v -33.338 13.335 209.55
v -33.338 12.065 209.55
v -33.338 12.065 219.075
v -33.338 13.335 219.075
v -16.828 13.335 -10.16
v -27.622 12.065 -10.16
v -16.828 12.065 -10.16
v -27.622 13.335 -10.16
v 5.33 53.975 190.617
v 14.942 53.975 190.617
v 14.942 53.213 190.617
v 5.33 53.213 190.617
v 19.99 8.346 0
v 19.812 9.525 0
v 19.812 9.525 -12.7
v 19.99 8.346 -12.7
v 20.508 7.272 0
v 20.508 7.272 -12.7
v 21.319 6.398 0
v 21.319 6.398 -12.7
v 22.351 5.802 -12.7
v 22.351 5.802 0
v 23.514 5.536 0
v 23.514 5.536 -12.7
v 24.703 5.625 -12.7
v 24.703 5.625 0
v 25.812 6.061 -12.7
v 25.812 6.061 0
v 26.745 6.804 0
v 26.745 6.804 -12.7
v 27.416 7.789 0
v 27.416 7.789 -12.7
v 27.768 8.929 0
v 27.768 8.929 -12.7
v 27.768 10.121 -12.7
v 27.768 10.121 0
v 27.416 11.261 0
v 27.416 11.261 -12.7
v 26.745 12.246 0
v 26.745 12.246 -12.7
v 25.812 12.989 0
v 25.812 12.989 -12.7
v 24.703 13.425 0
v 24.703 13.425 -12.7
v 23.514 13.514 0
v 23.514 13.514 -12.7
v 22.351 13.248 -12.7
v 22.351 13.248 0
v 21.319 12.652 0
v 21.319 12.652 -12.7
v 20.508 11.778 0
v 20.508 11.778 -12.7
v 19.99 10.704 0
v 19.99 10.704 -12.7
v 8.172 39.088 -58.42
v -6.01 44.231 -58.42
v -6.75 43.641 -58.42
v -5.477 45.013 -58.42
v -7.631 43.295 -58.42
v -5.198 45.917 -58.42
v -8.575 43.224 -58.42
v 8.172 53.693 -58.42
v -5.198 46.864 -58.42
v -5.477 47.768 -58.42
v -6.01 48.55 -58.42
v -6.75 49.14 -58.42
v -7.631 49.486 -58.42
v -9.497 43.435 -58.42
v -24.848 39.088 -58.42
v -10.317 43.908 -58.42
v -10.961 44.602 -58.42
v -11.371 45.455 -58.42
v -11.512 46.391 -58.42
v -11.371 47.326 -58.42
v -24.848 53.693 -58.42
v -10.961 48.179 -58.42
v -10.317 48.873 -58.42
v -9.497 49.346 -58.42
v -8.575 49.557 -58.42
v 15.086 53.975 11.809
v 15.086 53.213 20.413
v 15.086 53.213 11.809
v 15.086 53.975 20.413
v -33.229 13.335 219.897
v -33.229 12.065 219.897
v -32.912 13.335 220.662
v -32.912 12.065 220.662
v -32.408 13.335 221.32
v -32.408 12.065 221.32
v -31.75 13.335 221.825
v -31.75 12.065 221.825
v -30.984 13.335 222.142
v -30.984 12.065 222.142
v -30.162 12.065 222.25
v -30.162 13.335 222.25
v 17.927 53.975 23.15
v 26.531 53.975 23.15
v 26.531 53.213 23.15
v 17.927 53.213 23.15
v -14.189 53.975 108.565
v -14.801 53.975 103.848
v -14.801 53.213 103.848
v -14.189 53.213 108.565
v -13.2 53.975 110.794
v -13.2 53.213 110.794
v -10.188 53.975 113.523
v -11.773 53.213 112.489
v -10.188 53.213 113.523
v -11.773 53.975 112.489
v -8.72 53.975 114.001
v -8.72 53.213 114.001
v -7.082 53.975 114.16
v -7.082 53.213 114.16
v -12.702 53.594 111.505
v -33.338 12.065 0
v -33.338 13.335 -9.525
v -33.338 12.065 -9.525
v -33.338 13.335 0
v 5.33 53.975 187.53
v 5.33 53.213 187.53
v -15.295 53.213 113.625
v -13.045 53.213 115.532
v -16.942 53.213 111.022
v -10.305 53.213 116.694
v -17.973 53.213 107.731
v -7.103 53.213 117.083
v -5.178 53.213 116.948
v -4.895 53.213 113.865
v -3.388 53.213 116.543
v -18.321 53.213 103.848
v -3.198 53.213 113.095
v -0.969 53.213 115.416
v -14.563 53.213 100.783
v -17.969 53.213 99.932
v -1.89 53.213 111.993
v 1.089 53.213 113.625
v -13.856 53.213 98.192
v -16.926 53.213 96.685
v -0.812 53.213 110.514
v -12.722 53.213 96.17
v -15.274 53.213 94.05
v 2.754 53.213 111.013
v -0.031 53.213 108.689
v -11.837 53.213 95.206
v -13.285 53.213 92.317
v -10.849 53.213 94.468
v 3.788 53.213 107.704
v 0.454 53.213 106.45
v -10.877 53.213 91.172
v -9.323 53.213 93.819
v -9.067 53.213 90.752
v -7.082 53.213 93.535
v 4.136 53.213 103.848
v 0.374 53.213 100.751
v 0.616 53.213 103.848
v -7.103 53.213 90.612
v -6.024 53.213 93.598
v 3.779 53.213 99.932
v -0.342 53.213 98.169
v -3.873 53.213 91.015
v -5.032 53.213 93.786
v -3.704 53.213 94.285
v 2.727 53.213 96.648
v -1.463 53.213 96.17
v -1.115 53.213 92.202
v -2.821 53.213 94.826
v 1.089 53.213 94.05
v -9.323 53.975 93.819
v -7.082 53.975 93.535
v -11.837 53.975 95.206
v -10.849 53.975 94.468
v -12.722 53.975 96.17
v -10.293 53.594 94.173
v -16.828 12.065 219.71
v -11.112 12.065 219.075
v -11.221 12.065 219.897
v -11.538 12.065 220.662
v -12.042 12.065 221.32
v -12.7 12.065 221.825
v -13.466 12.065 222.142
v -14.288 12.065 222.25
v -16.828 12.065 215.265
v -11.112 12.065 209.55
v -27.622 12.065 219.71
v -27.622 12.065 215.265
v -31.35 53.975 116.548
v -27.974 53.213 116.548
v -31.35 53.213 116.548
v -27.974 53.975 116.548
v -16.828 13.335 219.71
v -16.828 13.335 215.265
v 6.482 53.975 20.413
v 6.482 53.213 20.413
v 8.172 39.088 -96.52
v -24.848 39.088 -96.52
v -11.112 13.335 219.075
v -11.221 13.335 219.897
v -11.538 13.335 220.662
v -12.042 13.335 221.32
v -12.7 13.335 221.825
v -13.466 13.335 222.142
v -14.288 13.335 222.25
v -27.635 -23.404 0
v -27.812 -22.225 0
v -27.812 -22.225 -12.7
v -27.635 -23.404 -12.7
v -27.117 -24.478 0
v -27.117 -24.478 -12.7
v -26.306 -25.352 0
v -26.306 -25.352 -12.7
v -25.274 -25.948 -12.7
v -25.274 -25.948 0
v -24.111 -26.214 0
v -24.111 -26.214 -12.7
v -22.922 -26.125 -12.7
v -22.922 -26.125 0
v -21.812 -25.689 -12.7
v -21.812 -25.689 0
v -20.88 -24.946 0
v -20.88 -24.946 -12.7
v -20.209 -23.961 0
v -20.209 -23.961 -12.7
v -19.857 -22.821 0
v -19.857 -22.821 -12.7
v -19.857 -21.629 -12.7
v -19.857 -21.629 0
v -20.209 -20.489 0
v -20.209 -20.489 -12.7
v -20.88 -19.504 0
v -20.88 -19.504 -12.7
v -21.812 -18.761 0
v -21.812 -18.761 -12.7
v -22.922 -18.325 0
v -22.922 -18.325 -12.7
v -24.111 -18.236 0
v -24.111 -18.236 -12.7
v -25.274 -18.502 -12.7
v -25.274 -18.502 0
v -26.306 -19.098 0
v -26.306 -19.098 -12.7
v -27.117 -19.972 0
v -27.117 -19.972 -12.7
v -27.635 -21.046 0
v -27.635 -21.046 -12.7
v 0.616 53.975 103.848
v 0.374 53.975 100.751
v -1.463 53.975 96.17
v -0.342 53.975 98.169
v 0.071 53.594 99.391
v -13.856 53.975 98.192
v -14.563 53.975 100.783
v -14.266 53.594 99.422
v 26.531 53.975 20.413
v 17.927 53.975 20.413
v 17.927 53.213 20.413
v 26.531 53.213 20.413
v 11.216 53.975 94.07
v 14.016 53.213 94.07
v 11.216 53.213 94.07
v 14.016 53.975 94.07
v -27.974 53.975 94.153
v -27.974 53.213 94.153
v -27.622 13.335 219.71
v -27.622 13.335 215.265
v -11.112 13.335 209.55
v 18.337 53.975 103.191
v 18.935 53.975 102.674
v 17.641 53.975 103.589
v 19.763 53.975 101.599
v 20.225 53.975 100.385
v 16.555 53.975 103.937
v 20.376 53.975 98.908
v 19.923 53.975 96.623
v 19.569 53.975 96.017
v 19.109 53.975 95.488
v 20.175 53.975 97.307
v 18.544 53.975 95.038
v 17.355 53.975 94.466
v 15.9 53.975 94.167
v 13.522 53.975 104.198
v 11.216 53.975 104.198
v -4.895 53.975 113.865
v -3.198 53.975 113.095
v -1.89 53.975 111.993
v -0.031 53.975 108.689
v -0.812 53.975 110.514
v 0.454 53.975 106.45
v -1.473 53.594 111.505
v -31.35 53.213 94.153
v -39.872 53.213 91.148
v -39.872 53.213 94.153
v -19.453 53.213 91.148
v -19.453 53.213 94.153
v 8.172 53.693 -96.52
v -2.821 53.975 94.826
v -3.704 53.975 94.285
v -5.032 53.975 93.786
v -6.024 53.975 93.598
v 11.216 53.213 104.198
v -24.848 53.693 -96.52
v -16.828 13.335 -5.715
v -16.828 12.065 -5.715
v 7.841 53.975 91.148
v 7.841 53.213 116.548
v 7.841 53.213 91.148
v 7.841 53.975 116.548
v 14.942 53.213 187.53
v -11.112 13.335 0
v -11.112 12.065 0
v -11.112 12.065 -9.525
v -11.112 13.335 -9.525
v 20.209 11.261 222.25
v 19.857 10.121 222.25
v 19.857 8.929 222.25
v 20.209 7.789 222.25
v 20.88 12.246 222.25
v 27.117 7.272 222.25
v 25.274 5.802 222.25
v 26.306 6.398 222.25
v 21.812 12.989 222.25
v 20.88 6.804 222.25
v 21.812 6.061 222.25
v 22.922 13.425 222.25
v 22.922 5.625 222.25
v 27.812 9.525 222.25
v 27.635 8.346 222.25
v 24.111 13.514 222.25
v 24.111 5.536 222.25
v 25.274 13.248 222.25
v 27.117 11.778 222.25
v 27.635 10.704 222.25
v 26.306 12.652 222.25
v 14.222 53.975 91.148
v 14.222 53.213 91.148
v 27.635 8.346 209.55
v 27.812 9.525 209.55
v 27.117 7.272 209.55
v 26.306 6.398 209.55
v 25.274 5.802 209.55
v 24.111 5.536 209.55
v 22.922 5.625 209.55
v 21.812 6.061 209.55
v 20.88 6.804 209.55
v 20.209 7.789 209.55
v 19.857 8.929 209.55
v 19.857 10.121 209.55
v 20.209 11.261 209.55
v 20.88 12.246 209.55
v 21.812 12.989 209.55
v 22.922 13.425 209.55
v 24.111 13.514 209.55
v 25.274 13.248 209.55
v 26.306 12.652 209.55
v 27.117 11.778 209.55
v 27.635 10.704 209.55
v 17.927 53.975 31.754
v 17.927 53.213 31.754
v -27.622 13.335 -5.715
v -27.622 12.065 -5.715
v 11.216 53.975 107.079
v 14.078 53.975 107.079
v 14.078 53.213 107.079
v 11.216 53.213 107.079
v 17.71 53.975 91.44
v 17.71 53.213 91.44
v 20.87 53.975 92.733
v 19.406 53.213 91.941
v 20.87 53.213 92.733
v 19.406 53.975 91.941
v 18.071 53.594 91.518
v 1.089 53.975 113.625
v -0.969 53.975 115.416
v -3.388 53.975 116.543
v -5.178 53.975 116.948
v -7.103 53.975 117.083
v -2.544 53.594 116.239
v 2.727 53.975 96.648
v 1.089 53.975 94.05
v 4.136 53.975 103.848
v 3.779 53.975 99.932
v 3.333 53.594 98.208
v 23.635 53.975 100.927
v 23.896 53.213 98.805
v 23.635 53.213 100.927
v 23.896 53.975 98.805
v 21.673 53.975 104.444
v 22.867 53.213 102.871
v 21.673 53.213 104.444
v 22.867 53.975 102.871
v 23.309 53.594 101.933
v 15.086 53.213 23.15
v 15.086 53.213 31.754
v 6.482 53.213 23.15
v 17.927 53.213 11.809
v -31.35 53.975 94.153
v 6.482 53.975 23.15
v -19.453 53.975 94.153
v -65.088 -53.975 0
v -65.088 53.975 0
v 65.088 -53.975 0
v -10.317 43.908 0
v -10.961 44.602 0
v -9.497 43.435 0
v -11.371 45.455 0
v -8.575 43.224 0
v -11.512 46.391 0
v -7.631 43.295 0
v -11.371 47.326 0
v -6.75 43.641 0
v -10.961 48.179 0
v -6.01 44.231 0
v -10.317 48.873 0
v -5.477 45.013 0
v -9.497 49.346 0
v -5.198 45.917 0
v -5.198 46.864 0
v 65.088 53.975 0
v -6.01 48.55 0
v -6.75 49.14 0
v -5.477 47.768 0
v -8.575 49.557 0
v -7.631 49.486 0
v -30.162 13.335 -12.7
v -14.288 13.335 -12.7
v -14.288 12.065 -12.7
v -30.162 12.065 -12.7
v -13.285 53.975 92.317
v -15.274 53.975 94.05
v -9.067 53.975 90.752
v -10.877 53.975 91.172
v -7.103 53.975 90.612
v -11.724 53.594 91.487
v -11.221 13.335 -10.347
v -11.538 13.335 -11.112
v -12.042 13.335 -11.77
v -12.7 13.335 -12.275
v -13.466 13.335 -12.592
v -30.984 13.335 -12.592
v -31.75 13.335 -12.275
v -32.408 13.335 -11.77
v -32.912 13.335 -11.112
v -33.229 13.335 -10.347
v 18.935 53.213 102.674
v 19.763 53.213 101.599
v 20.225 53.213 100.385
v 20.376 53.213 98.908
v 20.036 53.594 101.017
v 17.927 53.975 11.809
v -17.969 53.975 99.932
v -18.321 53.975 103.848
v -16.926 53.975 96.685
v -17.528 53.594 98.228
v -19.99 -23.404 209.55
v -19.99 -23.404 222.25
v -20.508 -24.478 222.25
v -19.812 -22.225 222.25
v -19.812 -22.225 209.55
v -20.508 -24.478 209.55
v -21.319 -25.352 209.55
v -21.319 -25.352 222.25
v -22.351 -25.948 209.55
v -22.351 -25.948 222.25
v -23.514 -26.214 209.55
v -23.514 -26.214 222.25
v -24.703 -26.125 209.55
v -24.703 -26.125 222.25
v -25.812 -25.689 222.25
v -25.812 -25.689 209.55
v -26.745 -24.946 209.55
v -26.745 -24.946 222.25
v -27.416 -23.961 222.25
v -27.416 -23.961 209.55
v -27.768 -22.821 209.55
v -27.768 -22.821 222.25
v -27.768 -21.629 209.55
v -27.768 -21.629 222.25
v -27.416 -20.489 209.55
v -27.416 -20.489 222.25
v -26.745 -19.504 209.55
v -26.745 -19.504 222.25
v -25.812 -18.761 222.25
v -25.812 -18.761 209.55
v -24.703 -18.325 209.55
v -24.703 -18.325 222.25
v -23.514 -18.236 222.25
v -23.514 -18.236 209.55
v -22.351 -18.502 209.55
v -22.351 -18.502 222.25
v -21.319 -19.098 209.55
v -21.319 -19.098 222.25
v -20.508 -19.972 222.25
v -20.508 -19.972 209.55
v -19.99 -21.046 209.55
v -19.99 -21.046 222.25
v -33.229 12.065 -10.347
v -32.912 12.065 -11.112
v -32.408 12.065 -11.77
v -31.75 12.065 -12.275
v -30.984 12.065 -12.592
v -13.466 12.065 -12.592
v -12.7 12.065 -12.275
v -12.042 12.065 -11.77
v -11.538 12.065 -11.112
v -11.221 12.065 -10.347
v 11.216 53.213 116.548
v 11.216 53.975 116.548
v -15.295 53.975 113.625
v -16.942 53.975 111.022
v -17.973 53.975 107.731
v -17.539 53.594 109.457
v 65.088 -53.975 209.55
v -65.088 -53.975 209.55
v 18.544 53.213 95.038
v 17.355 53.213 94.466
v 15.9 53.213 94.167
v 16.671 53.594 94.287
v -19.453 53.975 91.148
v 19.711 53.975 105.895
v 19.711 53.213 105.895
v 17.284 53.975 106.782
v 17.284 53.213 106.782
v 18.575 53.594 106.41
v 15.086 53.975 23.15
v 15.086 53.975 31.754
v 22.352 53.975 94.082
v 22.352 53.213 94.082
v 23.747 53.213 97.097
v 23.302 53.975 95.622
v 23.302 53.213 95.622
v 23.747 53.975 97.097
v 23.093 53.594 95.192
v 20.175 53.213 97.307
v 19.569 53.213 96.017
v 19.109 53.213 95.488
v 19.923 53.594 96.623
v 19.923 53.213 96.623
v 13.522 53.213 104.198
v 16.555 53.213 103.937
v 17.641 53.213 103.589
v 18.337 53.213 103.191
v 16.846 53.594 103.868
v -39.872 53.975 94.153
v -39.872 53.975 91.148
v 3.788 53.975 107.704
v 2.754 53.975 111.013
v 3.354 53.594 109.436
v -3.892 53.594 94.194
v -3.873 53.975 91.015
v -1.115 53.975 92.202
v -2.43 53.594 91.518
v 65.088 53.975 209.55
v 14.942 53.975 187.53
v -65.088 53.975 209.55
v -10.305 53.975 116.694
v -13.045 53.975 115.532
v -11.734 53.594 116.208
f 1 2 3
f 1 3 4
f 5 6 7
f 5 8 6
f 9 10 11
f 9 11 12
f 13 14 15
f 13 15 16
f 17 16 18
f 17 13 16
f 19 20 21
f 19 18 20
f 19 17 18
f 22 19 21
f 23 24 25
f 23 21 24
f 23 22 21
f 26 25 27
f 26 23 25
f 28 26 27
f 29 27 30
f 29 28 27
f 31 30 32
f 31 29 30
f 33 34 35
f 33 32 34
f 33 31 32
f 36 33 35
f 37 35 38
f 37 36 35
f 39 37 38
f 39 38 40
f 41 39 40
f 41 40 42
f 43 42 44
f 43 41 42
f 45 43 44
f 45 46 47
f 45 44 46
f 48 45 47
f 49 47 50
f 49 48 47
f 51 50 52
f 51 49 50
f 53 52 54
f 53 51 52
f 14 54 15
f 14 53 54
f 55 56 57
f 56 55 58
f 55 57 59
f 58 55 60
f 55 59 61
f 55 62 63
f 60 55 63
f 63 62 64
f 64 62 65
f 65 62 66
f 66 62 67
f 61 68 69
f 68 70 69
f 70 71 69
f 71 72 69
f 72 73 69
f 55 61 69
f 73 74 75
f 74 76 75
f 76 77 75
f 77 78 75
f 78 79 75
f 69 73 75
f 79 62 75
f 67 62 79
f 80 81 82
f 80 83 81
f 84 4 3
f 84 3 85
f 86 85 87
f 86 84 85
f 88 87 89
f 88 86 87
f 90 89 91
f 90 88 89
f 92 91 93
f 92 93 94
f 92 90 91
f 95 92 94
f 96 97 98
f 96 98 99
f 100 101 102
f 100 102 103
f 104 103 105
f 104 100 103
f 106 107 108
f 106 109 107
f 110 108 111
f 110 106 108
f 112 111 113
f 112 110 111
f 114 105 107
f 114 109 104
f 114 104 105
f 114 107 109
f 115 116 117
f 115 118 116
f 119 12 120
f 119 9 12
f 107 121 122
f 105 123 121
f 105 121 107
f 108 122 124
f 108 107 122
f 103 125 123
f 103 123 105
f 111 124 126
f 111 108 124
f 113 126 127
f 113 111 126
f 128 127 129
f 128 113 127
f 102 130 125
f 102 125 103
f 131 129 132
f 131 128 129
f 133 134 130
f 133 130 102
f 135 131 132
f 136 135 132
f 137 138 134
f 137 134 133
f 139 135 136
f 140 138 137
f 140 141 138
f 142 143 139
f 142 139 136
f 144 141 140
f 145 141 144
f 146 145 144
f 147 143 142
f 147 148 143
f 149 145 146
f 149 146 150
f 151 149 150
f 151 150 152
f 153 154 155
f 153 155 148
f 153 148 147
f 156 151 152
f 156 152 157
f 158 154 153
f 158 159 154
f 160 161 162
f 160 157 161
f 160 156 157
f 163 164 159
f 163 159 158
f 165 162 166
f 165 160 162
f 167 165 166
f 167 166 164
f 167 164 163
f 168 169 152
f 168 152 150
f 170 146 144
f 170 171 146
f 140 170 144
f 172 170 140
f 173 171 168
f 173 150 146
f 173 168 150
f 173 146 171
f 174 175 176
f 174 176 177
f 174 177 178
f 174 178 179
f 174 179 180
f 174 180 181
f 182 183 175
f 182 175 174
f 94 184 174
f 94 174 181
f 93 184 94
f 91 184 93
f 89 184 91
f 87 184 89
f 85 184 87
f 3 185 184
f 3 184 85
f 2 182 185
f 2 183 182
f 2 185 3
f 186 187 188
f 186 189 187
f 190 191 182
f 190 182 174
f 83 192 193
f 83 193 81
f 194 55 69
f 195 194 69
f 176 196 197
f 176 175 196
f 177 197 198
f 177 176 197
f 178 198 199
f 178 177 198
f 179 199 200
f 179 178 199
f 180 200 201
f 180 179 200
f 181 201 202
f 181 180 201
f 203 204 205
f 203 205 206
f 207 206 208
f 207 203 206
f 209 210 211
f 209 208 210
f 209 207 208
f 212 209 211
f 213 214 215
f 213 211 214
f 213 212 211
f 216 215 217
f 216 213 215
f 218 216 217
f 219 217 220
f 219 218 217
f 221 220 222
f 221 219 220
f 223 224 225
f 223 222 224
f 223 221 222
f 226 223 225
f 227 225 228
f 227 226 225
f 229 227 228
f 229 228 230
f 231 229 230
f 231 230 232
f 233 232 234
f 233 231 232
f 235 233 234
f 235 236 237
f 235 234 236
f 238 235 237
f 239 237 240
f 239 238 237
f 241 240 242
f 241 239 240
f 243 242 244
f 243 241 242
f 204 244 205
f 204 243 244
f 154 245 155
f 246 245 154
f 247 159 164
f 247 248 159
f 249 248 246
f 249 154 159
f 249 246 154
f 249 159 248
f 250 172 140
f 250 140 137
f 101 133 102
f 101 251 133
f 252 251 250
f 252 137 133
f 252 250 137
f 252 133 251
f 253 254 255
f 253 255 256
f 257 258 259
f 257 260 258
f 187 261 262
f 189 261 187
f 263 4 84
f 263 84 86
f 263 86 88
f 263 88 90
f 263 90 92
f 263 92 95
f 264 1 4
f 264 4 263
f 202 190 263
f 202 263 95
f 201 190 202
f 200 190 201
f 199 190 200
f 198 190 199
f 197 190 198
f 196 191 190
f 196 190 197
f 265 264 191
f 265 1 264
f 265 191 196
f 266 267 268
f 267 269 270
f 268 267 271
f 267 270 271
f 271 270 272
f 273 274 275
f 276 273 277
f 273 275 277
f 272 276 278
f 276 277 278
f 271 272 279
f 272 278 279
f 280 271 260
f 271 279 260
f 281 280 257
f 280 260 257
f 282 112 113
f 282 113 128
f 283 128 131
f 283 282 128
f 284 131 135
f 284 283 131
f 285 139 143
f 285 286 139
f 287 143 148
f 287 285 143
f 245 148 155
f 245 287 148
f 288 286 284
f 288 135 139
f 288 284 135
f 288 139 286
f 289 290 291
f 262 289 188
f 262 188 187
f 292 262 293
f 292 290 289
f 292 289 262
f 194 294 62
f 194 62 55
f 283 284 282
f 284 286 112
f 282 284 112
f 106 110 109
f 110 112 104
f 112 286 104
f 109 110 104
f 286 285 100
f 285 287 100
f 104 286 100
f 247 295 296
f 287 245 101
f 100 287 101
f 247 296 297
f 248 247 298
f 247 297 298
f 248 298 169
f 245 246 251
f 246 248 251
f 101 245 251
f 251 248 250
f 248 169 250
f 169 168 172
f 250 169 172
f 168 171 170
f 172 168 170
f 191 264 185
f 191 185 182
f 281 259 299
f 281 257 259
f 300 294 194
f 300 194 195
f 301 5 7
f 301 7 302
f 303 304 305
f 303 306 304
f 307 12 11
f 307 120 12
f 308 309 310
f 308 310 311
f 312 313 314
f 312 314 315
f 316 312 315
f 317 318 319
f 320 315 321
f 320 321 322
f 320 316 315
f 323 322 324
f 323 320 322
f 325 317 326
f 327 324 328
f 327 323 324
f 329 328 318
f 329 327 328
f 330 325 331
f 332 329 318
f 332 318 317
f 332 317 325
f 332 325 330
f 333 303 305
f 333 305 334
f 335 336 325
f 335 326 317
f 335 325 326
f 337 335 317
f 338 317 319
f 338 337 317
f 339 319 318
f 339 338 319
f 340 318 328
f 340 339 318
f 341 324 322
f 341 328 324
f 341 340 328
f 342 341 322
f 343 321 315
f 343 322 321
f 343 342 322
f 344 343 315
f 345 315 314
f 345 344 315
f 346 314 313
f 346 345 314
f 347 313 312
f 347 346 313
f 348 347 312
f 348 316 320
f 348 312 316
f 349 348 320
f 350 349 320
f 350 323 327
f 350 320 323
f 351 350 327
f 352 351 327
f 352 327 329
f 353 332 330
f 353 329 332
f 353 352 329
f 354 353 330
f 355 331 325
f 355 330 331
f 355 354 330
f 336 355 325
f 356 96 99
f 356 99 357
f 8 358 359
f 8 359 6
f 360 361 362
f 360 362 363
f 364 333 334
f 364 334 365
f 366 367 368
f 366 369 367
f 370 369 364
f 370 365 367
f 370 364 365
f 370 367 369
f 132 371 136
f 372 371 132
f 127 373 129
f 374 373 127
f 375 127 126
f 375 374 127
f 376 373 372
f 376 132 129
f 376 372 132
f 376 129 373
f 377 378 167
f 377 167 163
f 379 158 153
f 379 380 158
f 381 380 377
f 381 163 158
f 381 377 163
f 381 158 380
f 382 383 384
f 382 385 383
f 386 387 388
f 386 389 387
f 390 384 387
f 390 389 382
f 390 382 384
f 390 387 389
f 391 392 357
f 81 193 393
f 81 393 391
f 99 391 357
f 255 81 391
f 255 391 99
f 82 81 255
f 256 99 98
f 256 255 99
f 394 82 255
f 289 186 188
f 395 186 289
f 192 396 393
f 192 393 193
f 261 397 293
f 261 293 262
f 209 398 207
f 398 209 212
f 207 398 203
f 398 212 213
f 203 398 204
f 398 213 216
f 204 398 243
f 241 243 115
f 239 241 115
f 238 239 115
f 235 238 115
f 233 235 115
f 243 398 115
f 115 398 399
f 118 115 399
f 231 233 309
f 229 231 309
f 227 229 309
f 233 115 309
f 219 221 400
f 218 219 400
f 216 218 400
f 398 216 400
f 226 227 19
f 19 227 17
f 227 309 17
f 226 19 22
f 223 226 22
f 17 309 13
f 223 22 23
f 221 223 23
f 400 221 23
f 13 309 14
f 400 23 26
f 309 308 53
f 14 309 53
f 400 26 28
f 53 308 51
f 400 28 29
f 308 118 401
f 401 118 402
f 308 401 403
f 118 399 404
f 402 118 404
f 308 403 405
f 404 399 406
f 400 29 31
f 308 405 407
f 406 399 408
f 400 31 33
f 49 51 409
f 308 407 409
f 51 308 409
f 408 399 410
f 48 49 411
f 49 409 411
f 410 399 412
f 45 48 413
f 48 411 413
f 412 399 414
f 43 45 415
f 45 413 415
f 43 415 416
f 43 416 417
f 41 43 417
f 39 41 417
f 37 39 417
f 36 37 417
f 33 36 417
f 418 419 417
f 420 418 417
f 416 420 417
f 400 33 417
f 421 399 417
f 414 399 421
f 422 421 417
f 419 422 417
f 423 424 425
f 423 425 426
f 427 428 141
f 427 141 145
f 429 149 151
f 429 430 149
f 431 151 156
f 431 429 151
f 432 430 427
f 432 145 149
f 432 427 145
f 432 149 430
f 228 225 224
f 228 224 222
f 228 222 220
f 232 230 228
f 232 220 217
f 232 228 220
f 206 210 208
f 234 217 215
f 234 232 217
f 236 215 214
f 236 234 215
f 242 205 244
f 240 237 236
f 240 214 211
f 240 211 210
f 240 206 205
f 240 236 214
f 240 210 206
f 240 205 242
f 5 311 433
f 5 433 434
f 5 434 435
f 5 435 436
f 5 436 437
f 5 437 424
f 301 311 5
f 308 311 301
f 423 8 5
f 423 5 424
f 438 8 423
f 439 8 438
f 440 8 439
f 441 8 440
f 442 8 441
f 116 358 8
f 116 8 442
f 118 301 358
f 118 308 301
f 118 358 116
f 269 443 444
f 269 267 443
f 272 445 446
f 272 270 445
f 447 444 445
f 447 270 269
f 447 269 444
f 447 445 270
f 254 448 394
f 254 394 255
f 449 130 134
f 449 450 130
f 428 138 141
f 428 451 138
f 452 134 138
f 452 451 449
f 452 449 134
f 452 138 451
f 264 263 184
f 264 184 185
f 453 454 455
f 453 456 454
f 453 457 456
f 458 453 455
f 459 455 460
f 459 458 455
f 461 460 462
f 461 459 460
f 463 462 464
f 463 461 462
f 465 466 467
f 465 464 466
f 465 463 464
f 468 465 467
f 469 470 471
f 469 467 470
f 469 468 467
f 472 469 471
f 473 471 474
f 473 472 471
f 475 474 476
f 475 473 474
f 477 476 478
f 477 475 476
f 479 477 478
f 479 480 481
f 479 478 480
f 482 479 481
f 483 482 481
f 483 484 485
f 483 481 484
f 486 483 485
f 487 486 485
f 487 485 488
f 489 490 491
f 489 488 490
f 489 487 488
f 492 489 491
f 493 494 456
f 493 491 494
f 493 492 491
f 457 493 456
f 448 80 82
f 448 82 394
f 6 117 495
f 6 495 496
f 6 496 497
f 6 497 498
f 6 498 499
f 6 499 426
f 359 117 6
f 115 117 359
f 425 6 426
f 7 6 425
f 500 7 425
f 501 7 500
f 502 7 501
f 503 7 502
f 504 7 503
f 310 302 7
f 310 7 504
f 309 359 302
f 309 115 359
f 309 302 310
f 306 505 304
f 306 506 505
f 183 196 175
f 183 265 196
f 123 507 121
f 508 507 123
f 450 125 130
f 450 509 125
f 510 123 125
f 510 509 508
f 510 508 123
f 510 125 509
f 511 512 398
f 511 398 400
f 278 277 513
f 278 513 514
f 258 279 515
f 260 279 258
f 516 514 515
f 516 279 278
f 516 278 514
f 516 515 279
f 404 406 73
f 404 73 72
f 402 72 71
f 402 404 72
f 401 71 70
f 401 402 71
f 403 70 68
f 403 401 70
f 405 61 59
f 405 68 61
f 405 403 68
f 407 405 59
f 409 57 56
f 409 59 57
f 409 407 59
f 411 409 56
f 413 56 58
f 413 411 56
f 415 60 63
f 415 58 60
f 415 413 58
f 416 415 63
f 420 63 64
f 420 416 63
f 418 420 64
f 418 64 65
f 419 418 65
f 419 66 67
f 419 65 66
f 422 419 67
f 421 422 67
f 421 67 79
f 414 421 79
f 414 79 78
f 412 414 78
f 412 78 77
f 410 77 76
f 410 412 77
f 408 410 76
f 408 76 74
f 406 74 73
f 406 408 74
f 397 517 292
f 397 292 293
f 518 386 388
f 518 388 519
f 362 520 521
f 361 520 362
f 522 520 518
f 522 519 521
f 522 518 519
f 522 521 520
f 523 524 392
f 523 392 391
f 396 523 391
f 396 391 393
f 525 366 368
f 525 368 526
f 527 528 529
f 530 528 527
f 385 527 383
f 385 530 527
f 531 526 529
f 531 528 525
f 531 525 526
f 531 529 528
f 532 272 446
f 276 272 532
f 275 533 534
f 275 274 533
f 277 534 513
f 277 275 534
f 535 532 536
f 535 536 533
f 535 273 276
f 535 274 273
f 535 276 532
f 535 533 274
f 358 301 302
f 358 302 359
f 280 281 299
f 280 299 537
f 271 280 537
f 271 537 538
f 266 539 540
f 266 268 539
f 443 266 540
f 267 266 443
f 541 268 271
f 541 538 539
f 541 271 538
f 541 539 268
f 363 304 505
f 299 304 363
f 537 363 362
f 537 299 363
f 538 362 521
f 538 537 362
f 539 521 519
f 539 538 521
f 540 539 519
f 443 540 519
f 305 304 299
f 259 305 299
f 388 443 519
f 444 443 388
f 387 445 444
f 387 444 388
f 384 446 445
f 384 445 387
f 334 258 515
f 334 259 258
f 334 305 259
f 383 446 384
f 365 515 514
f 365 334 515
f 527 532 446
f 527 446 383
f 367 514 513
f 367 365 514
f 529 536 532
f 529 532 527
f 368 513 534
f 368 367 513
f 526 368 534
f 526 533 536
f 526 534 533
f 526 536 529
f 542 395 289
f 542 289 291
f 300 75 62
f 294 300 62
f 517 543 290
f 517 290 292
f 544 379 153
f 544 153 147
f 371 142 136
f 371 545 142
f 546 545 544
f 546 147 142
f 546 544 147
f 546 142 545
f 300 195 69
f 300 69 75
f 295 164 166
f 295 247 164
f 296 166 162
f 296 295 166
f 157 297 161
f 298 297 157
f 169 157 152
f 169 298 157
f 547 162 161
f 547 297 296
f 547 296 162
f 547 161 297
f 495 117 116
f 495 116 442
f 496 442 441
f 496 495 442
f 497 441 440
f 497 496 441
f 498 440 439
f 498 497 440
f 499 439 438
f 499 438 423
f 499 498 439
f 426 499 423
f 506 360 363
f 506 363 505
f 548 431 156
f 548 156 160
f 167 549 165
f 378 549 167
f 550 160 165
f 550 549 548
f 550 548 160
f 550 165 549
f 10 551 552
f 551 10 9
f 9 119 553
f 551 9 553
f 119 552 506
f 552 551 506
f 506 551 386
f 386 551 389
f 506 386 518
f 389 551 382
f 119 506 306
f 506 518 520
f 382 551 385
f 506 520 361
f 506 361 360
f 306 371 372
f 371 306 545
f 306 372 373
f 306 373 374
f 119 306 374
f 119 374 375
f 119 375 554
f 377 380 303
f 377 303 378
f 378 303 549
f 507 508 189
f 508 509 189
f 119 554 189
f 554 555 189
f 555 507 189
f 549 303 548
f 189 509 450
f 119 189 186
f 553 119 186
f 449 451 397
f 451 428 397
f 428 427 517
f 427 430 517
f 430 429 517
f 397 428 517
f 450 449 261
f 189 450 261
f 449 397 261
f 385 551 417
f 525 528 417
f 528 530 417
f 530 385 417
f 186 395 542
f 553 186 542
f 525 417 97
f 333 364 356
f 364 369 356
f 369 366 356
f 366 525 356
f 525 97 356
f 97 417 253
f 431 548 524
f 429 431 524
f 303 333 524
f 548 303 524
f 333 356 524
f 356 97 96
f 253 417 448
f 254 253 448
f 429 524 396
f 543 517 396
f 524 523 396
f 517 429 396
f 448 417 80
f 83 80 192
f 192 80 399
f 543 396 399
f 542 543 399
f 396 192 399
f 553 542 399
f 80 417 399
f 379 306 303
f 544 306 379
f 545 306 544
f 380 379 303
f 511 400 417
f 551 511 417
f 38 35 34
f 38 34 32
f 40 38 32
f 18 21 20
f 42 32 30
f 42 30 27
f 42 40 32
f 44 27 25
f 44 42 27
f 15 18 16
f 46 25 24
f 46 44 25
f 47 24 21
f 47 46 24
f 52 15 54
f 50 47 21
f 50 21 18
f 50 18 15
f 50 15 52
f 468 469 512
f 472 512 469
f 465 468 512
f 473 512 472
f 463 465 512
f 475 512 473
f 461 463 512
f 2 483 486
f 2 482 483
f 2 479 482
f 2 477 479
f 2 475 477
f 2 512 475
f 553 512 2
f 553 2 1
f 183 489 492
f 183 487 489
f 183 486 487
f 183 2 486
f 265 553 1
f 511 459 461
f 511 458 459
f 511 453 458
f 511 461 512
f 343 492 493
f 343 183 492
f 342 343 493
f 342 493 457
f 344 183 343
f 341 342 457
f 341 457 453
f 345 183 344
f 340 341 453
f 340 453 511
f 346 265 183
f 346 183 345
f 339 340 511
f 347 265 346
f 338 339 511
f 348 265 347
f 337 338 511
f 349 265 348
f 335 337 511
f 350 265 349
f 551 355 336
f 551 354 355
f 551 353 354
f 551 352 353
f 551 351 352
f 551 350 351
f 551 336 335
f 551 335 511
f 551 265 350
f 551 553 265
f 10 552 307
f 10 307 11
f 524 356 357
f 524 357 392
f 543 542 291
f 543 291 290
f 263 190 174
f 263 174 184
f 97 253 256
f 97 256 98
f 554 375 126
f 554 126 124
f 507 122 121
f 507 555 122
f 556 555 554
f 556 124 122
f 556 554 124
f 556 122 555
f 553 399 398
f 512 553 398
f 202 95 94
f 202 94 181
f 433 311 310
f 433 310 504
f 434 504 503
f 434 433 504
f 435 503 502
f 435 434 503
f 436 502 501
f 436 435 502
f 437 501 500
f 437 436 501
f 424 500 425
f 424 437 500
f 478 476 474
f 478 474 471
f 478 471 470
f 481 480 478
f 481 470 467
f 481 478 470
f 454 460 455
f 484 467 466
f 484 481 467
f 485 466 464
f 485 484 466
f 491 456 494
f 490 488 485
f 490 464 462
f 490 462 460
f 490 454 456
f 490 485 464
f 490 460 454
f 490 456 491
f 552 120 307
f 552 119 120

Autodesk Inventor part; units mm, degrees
ref_plane "YZ Plane" through (0, 0, 0) normal (1, 0, 0) x (0, 1, 0)
ref_plane "XZ Plane" through (0, 0, 0) normal (0, 1, 0) x (-1, 0, 0)
ref_plane "XY Plane" through (0, 0, 0) normal (0, 0, 1) x (1, 0, 0)
sketch "Sketch1" plane through (0, 0, 0) normal (0, 0, 1) x (1, 0, 0)
  line L0 (-65.0875, -53.975) -> (65.0875, -53.975)
  line L1 (65.0875, -53.975) -> (65.0875, 53.975)
  line L2 (65.0875, 53.975) -> (-65.0875, 53.975)
  line L3 (-65.0875, 53.975) -> (-65.0875, -53.975)
  line L4 (-65.0875, -53.975) -> (65.0875, 53.975) construction
  line L5 (65.0875, -53.975) -> (-65.0875, 53.975) construction
  point P0 (0, 0)
  dimension "d0" = 130.175
  dimension "d1" = 107.95
extrude "Extrusion1" add sketch "Sketch1" along normal blind 209.55
sketch "Sketch2" plane through (0, 0, 209.55) normal (0, 0, 1) x (1, 0, 0)
  line L0 (-65.0875, -53.975) -> (65.0875, -53.975) construction
  line L1 (-65.0875, 53.975) -> (-65.0875, -53.975) construction
  circle A0 centre (-23.8125, -22.225) radius 4
  circle A1 centre (23.8125, 9.525) radius 4
  line L2 (-11.1125, 12.065) -> (-33.3375, 12.065)
  line L3 (-33.3375, 12.065) -> (-33.3375, 13.335)
  line L4 (-33.3375, 13.335) -> (-11.1125, 13.335)
  line L5 (-11.1125, 13.335) -> (-11.1125, 12.065)
  line L6 (-33.3375, 12.7) -> (-65.0875, 12.7) construction
  point P0 (0, 0)
  dimension "d4" = 31.75
  dimension "d5" = 41.275
  dimension "d6" = 8
  dimension "d7" = 63.5
  dimension "d8" = 88.9
  dimension "d13" = 31.75
  dimension "d14" = 53.975
  dimension "d15" = 66.675
  dimension "d16" = 1.27
extrude "Extrusion2" add sketch "Sketch2" along normal blind 12.7
sketch "Sketch3" plane through (0, 0, 0) normal (0, 0, -1) x (-1, 0, 0)
  circle A0 centre (-23.8125, 9.525) radius 4 projected
  circle A1 centre (23.8125, -22.225) radius 4 projected
  line L0 (33.3375, 12.065) -> (11.1125, 12.065) projected
  line L1 (11.1125, 12.065) -> (11.1125, 13.335) projected
  line L2 (11.1125, 13.335) -> (33.3375, 13.335) projected
  line L3 (33.3375, 13.335) -> (33.3375, 12.065) projected
  point P0 (0, 0)
extrude "Extrusion3" add sketch "Sketch3" along normal blind 12.7
sketch "Sketch4" plane through (-33.3375, 13.335, 0) normal (0, 1, 0) x (1, 0, 0)
  line L0 (0, 12.7) -> (22.225, 12.7) projected
  line L1 (22.225, 0) -> (22.225, 12.7) projected
  line L2 (0, 0) -> (0, 12.7) projected
  line L3 (22.225, -209.55) -> (22.225, -222.25) projected
  line L4 (22.225, -222.25) -> (0, -222.25) projected
  line L5 (0, -209.55) -> (0, -222.25) projected
  line L6 (16.51, -219.71) -> (5.715, -219.71)
  line L7 (5.715, -219.71) -> (5.715, -215.265)
  line L8 (5.715, -215.265) -> (16.51, -215.265)
  line L9 (16.51, -215.265) -> (16.51, -219.71)
  line L10 (16.51, 5.715) -> (5.715, 5.715)
  line L11 (5.715, 5.715) -> (5.715, 10.16)
  line L12 (5.715, 10.16) -> (16.51, 10.16)
  line L13 (16.51, 10.16) -> (16.51, 5.715)
  line L14 (5.715, 10.16) -> (0, 12.7) construction
  line L15 (16.51, 10.16) -> (22.225, 12.7) construction
  line L16 (22.225, -222.25) -> (16.51, -219.71) construction
  line L17 (5.715, -219.71) -> (0, -222.25) construction
  point P0 (33.3375, 0)
  dimension "d17" = 10.795
  dimension "d18" = 6.985
  dimension "d19" = 2.54
extrude "Extrusion4" cut sketch "Sketch4" against normal up to surface (1.27 mm away)
fillet "Fillet1" radius 3.175 4 edges at (-33.3375, 12.7, -12.7) (-11.1125, 12.7, -12.7) (-33.3375, 12.7, 222.25) (-11.1125, 12.7, 222.25)
thread "Thread1" size "M8x1.25" class "6g" standard "ANSI Metric M Profile" full length
thread "Thread2" size "M8x1.25" class "6g" standard "ANSI Metric M Profile" full length
thread "Thread3" size "M8x1.25" class "6g" standard "ANSI Metric M Profile" full length
thread "Thread4" size "M8x1.25" class "6g" standard "ANSI Metric M Profile" full length
sketch "Sketch5" plane through (-65.0875, 53.975, 0) normal (0, 1, 0) x (1, 0, 0)
  line L0 (25.2364, -11.8087) -> (114.825, -11.8087) construction
  line L1 (114.825, -11.8087) -> (114.825, -199.7093) construction
  line L2 (114.825, -199.7093) -> (25.2364, -199.7093) construction
  line L3 (25.2364, -199.7093) -> (25.2364, -11.8087) construction
  line L4 (91.6181, -23.1502) -> (83.0142, -23.1502)
  line L5 (83.0142, -23.1502) -> (83.0142, -31.7541)
  line L6 (83.0142, -31.7541) -> (80.1737, -31.7541)
  line L7 (80.1737, -31.7541) -> (80.1737, -23.1502)
  line L8 (80.1737, -23.1502) -> (71.5698, -23.1502)
  line L9 (71.5698, -23.1502) -> (71.5698, -20.4126)
  line L10 (71.5698, -20.4126) -> (80.1737, -20.4126)
  line L11 (80.1737, -20.4126) -> (80.1737, -11.8087)
  line L12 (80.1737, -11.8087) -> (83.0142, -11.8087)
  line L13 (83.0142, -11.8087) -> (83.0142, -20.4126)
  line L14 (83.0142, -20.4126) -> (91.6181, -20.4126)
  line L15 (91.6181, -20.4126) -> (91.6181, -23.1502)
  line L16 (33.7374, -116.5476) -> (33.7374, -94.1528)
  line L17 (33.7374, -94.1528) -> (25.2158, -94.1528)
  line L18 (25.2158, -94.1528) -> (25.2158, -91.1476)
  line L19 (25.2158, -91.1476) -> (45.6346, -91.1476)
  line L20 (45.6346, -91.1476) -> (45.6346, -94.1528)
  line L21 (45.6346, -94.1528) -> (37.1131, -94.1528)
  line L22 (37.1131, -94.1528) -> (37.1131, -116.5476)
  line L23 (37.1131, -116.5476) -> (33.7374, -116.5476)
  spline S0 degree 2 poles (66.1769, -94.0499) (67.6178, -95.7377) (69.2233, -100.6778) (69.2233, -103.8476) knots 0 0 0 1 2 2 2
  spline S1 degree 2 poles (69.2233, -103.8476) (69.2233, -106.9351) (67.6589, -111.9369) (66.1769, -113.6248) knots 0 0 0 1 2 2 2
  spline S2 degree 2 poles (66.1769, -113.6248) (64.6126, -115.3949) (60.4753, -117.0828) (57.9847, -117.0828) knots 0 0 0 1 2 2 2
  spline S3 degree 2 poles (57.9847, -117.0828) (55.4118, -117.0828) (51.2951, -115.3332) (49.7925, -113.6248) knots 0 0 0 1 2 2 2
  spline S4 degree 2 poles (49.7925, -113.6248) (48.3311, -111.9369) (46.7667, -106.9763) (46.7667, -103.8476) knots 0 0 0 1 2 2 2
  spline S5 degree 2 poles (46.7667, -103.8476) (46.7667, -100.6572) (48.3516, -95.7995) (49.8131, -94.0499) knots 0 0 0 1 2 2 2
  spline S6 degree 2 poles (49.8131, -94.0499) (51.2951, -92.362) (55.4324, -90.6125) (57.9847, -90.6125) knots 0 0 0 1 2 2 2
  spline S7 degree 2 poles (57.9847, -90.6125) (60.5782, -90.6125) (64.7361, -92.4238) (66.1769, -94.0499) knots 0 0 0 1 2 2 2
  spline S8 degree 2 poles (65.7035, -103.8476) (65.7035, -101.3364) (64.6126, -97.4462) (63.6246, -96.17) knots 0 0 0 1 2 2 2
  spline S9 degree 2 poles (63.6246, -96.17) (62.616, -94.8526) (59.7755, -93.5353) (58.0053, -93.5353) knots 0 0 0 1 2 2 2
  spline S10 degree 2 poles (58.0053, -93.5353) (56.1734, -93.5353) (53.4152, -94.8115) (52.3654, -96.17) knots 0 0 0 1 2 2 2
  spline S11 degree 2 poles (52.3654, -96.17) (51.3568, -97.4667) (50.2865, -101.3776) (50.2865, -103.8476) knots 0 0 0 1 2 2 2
  spline S12 degree 2 poles (50.2865, -103.8476) (50.2865, -108.8494) (54.4855, -114.1599) (58.0053, -114.1599) knots 0 0 0 1 2 2 2
  spline S13 degree 2 poles (58.0053, -114.1599) (61.5251, -114.1599) (65.7035, -108.8494) (65.7035, -103.8476) knots 0 0 0 1 2 2 2
  spline S14 degree 2 poles (88.9834, -98.8047) (88.9834, -100.4514) (87.8102, -103.4154) (86.7604, -104.4445) knots 0 0 0 1 2 2 2
  spline S15 degree 2 poles (86.7604, -104.4445) (85.4431, -105.7413) (81.8821, -107.0792) (79.1651, -107.0792) knots 0 0 0 1 2 2 2
  line L24 (79.1651, -107.0792) -> (76.304, -107.0792)
  line L25 (76.304, -107.0792) -> (76.304, -116.5476)
  line L26 (76.304, -116.5476) -> (72.9283, -116.5476)
  line L27 (72.9283, -116.5476) -> (72.9283, -91.1476)
  line L28 (72.9283, -91.1476) -> (79.3092, -91.1476)
  spline S16 degree 2 poles (79.3092, -91.1476) (81.5734, -91.1476) (84.7432, -91.8886) (85.9576, -92.7326) knots 0 0 0 1 2 2 2
  spline S17 degree 2 poles (85.9576, -92.7326) (87.3779, -93.7) (88.9834, -96.6846) (88.9834, -98.8047) knots 0 0 0 1 2 2 2
  spline S18 degree 2 poles (85.4636, -98.9076) (85.4636, -97.5902) (84.558, -95.6554) (83.6317, -95.0379) knots 0 0 0 1 2 2 2
  spline S19 degree 2 poles (83.6317, -95.0379) (82.829, -94.5027) (80.6883, -94.0705) (79.1034, -94.0705) knots 0 0 0 1 2 2 2
  line L29 (79.1034, -94.0705) -> (76.304, -94.0705)
  line L30 (76.304, -94.0705) -> (76.304, -104.1975)
  line L31 (76.304, -104.1975) -> (78.6093, -104.1975)
  spline S20 degree 2 poles (78.6093, -104.1975) (80.6677, -104.1975) (83.1995, -103.5389) (84.0228, -102.6744) knots 0 0 0 1 2 2 2
  spline S21 degree 2 poles (84.0228, -102.6744) (84.7844, -101.9128) (85.4636, -100.122) (85.4636, -98.9076) knots 0 0 0 1 2 2 2
  line L32 (80.0296, -190.6172) -> (70.4171, -190.6172)
  line L33 (70.4171, -190.6172) -> (70.4171, -187.5297)
  line L34 (70.4171, -187.5297) -> (80.0296, -187.5297)
  line L35 (80.0296, -187.5297) -> (80.0296, -190.6172)
  point P0 (65.0875, 0)
extrude "Extrusion7" cut sketch "Sketch5" against normal blind 0.762
sketch "Sketch6" plane through (0, 0, 0) normal (0, 0, -1) x (-1, 0, 0)
  circle A0 centre (8.3375, 46.3906) radius 3.175
  point P0 (0, 0)
  dimension "d31" = 6.35
extrude "Extrusion5" add sketch "Sketch6" along normal blind 58.42
sketch "Sketch7" plane through (-8.3375, 46.3906, -58.42) normal (0, 0, -1) x (-1, 0, 0)
  circle A0 centre (0, 0) radius 3.175 projected
  line L0 (-16.51, -7.3025) -> (16.51, -7.3025)
  line L1 (16.51, -7.3025) -> (16.51, 7.3025)
  line L2 (16.51, 7.3025) -> (-16.51, 7.3025)
  line L3 (-16.51, 7.3025) -> (-16.51, -7.3025)
  line L4 (-16.51, -7.3025) -> (16.51, 7.3025) construction
  line L5 (16.51, -7.3025) -> (-16.51, 7.3025) construction
  point P0 (-8.3375, -46.3906)
  dimension "d34" = 14.605
  dimension "d35" = 33.02
extrude "Extrusion6" add sketch "Sketch7" along normal blind 38.1 contours A0 | L3 L2 L1 L0
properties part number "12S Module"
